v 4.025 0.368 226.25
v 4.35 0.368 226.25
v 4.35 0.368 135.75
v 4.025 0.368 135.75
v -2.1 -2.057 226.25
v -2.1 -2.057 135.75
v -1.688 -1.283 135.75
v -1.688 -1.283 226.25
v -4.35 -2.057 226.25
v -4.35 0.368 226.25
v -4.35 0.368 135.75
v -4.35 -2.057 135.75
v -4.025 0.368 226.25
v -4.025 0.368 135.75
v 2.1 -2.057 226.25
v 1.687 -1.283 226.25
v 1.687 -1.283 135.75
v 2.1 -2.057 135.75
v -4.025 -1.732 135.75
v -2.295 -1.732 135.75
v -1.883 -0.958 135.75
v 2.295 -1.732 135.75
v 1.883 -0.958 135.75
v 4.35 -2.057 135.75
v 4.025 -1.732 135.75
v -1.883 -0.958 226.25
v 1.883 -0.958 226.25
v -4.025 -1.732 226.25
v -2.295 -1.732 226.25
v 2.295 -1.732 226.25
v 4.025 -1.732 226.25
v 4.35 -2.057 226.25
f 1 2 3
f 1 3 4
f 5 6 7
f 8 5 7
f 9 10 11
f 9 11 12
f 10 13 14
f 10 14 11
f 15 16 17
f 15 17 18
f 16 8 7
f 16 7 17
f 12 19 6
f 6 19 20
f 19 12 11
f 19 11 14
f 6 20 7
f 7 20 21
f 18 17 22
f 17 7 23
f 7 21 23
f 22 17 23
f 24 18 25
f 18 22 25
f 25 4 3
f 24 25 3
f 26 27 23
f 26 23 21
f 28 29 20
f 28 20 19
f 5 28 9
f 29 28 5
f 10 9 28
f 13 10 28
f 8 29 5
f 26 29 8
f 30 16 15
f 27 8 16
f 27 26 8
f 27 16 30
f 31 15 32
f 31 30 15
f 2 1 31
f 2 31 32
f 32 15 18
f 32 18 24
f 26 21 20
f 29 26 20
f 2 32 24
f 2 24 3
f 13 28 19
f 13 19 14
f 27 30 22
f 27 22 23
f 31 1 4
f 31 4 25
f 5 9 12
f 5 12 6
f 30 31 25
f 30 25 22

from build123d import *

# Parameters (mm, degrees)
BOSS_EXTRUDE1_DEPTH = 362
SCALE1_SCALE        = 0.25


with BuildPart() as part:
    # Sketch1 → Boss-Extrude1 (new body)
    with BuildSketch(Plane.XY.offset(362)):
        Polygon((-9.180453293, -3.095455134), (-16.1, -3.095455134), (-16.1, 5.304544866), (-17.4, 5.304544866), (-17.4, -4.395455134), (-8.4, -4.395455134), (-6.749887033, -1.3), (6.750112967, -1.3), (8.4, -4.395455134), (17.4, -4.395455134), (17.4, 5.304544866), (16.1, 5.304544866), (16.1, -3.095455134), (9.18022736, -3.095455134), (7.530340327, 0), (-7.530340327, 0), align=None)
    extrude(amount=-BOSS_EXTRUDE1_DEPTH)


with BuildPart() as part_1:
    # Scale1: scaled about (-7.7465e-05, -1.277039924, 181)
    add(part.part.scale(SCALE1_SCALE).moved(Location((-5.8099e-05, -0.957779943, 135.75))))


solid = part_1.part
